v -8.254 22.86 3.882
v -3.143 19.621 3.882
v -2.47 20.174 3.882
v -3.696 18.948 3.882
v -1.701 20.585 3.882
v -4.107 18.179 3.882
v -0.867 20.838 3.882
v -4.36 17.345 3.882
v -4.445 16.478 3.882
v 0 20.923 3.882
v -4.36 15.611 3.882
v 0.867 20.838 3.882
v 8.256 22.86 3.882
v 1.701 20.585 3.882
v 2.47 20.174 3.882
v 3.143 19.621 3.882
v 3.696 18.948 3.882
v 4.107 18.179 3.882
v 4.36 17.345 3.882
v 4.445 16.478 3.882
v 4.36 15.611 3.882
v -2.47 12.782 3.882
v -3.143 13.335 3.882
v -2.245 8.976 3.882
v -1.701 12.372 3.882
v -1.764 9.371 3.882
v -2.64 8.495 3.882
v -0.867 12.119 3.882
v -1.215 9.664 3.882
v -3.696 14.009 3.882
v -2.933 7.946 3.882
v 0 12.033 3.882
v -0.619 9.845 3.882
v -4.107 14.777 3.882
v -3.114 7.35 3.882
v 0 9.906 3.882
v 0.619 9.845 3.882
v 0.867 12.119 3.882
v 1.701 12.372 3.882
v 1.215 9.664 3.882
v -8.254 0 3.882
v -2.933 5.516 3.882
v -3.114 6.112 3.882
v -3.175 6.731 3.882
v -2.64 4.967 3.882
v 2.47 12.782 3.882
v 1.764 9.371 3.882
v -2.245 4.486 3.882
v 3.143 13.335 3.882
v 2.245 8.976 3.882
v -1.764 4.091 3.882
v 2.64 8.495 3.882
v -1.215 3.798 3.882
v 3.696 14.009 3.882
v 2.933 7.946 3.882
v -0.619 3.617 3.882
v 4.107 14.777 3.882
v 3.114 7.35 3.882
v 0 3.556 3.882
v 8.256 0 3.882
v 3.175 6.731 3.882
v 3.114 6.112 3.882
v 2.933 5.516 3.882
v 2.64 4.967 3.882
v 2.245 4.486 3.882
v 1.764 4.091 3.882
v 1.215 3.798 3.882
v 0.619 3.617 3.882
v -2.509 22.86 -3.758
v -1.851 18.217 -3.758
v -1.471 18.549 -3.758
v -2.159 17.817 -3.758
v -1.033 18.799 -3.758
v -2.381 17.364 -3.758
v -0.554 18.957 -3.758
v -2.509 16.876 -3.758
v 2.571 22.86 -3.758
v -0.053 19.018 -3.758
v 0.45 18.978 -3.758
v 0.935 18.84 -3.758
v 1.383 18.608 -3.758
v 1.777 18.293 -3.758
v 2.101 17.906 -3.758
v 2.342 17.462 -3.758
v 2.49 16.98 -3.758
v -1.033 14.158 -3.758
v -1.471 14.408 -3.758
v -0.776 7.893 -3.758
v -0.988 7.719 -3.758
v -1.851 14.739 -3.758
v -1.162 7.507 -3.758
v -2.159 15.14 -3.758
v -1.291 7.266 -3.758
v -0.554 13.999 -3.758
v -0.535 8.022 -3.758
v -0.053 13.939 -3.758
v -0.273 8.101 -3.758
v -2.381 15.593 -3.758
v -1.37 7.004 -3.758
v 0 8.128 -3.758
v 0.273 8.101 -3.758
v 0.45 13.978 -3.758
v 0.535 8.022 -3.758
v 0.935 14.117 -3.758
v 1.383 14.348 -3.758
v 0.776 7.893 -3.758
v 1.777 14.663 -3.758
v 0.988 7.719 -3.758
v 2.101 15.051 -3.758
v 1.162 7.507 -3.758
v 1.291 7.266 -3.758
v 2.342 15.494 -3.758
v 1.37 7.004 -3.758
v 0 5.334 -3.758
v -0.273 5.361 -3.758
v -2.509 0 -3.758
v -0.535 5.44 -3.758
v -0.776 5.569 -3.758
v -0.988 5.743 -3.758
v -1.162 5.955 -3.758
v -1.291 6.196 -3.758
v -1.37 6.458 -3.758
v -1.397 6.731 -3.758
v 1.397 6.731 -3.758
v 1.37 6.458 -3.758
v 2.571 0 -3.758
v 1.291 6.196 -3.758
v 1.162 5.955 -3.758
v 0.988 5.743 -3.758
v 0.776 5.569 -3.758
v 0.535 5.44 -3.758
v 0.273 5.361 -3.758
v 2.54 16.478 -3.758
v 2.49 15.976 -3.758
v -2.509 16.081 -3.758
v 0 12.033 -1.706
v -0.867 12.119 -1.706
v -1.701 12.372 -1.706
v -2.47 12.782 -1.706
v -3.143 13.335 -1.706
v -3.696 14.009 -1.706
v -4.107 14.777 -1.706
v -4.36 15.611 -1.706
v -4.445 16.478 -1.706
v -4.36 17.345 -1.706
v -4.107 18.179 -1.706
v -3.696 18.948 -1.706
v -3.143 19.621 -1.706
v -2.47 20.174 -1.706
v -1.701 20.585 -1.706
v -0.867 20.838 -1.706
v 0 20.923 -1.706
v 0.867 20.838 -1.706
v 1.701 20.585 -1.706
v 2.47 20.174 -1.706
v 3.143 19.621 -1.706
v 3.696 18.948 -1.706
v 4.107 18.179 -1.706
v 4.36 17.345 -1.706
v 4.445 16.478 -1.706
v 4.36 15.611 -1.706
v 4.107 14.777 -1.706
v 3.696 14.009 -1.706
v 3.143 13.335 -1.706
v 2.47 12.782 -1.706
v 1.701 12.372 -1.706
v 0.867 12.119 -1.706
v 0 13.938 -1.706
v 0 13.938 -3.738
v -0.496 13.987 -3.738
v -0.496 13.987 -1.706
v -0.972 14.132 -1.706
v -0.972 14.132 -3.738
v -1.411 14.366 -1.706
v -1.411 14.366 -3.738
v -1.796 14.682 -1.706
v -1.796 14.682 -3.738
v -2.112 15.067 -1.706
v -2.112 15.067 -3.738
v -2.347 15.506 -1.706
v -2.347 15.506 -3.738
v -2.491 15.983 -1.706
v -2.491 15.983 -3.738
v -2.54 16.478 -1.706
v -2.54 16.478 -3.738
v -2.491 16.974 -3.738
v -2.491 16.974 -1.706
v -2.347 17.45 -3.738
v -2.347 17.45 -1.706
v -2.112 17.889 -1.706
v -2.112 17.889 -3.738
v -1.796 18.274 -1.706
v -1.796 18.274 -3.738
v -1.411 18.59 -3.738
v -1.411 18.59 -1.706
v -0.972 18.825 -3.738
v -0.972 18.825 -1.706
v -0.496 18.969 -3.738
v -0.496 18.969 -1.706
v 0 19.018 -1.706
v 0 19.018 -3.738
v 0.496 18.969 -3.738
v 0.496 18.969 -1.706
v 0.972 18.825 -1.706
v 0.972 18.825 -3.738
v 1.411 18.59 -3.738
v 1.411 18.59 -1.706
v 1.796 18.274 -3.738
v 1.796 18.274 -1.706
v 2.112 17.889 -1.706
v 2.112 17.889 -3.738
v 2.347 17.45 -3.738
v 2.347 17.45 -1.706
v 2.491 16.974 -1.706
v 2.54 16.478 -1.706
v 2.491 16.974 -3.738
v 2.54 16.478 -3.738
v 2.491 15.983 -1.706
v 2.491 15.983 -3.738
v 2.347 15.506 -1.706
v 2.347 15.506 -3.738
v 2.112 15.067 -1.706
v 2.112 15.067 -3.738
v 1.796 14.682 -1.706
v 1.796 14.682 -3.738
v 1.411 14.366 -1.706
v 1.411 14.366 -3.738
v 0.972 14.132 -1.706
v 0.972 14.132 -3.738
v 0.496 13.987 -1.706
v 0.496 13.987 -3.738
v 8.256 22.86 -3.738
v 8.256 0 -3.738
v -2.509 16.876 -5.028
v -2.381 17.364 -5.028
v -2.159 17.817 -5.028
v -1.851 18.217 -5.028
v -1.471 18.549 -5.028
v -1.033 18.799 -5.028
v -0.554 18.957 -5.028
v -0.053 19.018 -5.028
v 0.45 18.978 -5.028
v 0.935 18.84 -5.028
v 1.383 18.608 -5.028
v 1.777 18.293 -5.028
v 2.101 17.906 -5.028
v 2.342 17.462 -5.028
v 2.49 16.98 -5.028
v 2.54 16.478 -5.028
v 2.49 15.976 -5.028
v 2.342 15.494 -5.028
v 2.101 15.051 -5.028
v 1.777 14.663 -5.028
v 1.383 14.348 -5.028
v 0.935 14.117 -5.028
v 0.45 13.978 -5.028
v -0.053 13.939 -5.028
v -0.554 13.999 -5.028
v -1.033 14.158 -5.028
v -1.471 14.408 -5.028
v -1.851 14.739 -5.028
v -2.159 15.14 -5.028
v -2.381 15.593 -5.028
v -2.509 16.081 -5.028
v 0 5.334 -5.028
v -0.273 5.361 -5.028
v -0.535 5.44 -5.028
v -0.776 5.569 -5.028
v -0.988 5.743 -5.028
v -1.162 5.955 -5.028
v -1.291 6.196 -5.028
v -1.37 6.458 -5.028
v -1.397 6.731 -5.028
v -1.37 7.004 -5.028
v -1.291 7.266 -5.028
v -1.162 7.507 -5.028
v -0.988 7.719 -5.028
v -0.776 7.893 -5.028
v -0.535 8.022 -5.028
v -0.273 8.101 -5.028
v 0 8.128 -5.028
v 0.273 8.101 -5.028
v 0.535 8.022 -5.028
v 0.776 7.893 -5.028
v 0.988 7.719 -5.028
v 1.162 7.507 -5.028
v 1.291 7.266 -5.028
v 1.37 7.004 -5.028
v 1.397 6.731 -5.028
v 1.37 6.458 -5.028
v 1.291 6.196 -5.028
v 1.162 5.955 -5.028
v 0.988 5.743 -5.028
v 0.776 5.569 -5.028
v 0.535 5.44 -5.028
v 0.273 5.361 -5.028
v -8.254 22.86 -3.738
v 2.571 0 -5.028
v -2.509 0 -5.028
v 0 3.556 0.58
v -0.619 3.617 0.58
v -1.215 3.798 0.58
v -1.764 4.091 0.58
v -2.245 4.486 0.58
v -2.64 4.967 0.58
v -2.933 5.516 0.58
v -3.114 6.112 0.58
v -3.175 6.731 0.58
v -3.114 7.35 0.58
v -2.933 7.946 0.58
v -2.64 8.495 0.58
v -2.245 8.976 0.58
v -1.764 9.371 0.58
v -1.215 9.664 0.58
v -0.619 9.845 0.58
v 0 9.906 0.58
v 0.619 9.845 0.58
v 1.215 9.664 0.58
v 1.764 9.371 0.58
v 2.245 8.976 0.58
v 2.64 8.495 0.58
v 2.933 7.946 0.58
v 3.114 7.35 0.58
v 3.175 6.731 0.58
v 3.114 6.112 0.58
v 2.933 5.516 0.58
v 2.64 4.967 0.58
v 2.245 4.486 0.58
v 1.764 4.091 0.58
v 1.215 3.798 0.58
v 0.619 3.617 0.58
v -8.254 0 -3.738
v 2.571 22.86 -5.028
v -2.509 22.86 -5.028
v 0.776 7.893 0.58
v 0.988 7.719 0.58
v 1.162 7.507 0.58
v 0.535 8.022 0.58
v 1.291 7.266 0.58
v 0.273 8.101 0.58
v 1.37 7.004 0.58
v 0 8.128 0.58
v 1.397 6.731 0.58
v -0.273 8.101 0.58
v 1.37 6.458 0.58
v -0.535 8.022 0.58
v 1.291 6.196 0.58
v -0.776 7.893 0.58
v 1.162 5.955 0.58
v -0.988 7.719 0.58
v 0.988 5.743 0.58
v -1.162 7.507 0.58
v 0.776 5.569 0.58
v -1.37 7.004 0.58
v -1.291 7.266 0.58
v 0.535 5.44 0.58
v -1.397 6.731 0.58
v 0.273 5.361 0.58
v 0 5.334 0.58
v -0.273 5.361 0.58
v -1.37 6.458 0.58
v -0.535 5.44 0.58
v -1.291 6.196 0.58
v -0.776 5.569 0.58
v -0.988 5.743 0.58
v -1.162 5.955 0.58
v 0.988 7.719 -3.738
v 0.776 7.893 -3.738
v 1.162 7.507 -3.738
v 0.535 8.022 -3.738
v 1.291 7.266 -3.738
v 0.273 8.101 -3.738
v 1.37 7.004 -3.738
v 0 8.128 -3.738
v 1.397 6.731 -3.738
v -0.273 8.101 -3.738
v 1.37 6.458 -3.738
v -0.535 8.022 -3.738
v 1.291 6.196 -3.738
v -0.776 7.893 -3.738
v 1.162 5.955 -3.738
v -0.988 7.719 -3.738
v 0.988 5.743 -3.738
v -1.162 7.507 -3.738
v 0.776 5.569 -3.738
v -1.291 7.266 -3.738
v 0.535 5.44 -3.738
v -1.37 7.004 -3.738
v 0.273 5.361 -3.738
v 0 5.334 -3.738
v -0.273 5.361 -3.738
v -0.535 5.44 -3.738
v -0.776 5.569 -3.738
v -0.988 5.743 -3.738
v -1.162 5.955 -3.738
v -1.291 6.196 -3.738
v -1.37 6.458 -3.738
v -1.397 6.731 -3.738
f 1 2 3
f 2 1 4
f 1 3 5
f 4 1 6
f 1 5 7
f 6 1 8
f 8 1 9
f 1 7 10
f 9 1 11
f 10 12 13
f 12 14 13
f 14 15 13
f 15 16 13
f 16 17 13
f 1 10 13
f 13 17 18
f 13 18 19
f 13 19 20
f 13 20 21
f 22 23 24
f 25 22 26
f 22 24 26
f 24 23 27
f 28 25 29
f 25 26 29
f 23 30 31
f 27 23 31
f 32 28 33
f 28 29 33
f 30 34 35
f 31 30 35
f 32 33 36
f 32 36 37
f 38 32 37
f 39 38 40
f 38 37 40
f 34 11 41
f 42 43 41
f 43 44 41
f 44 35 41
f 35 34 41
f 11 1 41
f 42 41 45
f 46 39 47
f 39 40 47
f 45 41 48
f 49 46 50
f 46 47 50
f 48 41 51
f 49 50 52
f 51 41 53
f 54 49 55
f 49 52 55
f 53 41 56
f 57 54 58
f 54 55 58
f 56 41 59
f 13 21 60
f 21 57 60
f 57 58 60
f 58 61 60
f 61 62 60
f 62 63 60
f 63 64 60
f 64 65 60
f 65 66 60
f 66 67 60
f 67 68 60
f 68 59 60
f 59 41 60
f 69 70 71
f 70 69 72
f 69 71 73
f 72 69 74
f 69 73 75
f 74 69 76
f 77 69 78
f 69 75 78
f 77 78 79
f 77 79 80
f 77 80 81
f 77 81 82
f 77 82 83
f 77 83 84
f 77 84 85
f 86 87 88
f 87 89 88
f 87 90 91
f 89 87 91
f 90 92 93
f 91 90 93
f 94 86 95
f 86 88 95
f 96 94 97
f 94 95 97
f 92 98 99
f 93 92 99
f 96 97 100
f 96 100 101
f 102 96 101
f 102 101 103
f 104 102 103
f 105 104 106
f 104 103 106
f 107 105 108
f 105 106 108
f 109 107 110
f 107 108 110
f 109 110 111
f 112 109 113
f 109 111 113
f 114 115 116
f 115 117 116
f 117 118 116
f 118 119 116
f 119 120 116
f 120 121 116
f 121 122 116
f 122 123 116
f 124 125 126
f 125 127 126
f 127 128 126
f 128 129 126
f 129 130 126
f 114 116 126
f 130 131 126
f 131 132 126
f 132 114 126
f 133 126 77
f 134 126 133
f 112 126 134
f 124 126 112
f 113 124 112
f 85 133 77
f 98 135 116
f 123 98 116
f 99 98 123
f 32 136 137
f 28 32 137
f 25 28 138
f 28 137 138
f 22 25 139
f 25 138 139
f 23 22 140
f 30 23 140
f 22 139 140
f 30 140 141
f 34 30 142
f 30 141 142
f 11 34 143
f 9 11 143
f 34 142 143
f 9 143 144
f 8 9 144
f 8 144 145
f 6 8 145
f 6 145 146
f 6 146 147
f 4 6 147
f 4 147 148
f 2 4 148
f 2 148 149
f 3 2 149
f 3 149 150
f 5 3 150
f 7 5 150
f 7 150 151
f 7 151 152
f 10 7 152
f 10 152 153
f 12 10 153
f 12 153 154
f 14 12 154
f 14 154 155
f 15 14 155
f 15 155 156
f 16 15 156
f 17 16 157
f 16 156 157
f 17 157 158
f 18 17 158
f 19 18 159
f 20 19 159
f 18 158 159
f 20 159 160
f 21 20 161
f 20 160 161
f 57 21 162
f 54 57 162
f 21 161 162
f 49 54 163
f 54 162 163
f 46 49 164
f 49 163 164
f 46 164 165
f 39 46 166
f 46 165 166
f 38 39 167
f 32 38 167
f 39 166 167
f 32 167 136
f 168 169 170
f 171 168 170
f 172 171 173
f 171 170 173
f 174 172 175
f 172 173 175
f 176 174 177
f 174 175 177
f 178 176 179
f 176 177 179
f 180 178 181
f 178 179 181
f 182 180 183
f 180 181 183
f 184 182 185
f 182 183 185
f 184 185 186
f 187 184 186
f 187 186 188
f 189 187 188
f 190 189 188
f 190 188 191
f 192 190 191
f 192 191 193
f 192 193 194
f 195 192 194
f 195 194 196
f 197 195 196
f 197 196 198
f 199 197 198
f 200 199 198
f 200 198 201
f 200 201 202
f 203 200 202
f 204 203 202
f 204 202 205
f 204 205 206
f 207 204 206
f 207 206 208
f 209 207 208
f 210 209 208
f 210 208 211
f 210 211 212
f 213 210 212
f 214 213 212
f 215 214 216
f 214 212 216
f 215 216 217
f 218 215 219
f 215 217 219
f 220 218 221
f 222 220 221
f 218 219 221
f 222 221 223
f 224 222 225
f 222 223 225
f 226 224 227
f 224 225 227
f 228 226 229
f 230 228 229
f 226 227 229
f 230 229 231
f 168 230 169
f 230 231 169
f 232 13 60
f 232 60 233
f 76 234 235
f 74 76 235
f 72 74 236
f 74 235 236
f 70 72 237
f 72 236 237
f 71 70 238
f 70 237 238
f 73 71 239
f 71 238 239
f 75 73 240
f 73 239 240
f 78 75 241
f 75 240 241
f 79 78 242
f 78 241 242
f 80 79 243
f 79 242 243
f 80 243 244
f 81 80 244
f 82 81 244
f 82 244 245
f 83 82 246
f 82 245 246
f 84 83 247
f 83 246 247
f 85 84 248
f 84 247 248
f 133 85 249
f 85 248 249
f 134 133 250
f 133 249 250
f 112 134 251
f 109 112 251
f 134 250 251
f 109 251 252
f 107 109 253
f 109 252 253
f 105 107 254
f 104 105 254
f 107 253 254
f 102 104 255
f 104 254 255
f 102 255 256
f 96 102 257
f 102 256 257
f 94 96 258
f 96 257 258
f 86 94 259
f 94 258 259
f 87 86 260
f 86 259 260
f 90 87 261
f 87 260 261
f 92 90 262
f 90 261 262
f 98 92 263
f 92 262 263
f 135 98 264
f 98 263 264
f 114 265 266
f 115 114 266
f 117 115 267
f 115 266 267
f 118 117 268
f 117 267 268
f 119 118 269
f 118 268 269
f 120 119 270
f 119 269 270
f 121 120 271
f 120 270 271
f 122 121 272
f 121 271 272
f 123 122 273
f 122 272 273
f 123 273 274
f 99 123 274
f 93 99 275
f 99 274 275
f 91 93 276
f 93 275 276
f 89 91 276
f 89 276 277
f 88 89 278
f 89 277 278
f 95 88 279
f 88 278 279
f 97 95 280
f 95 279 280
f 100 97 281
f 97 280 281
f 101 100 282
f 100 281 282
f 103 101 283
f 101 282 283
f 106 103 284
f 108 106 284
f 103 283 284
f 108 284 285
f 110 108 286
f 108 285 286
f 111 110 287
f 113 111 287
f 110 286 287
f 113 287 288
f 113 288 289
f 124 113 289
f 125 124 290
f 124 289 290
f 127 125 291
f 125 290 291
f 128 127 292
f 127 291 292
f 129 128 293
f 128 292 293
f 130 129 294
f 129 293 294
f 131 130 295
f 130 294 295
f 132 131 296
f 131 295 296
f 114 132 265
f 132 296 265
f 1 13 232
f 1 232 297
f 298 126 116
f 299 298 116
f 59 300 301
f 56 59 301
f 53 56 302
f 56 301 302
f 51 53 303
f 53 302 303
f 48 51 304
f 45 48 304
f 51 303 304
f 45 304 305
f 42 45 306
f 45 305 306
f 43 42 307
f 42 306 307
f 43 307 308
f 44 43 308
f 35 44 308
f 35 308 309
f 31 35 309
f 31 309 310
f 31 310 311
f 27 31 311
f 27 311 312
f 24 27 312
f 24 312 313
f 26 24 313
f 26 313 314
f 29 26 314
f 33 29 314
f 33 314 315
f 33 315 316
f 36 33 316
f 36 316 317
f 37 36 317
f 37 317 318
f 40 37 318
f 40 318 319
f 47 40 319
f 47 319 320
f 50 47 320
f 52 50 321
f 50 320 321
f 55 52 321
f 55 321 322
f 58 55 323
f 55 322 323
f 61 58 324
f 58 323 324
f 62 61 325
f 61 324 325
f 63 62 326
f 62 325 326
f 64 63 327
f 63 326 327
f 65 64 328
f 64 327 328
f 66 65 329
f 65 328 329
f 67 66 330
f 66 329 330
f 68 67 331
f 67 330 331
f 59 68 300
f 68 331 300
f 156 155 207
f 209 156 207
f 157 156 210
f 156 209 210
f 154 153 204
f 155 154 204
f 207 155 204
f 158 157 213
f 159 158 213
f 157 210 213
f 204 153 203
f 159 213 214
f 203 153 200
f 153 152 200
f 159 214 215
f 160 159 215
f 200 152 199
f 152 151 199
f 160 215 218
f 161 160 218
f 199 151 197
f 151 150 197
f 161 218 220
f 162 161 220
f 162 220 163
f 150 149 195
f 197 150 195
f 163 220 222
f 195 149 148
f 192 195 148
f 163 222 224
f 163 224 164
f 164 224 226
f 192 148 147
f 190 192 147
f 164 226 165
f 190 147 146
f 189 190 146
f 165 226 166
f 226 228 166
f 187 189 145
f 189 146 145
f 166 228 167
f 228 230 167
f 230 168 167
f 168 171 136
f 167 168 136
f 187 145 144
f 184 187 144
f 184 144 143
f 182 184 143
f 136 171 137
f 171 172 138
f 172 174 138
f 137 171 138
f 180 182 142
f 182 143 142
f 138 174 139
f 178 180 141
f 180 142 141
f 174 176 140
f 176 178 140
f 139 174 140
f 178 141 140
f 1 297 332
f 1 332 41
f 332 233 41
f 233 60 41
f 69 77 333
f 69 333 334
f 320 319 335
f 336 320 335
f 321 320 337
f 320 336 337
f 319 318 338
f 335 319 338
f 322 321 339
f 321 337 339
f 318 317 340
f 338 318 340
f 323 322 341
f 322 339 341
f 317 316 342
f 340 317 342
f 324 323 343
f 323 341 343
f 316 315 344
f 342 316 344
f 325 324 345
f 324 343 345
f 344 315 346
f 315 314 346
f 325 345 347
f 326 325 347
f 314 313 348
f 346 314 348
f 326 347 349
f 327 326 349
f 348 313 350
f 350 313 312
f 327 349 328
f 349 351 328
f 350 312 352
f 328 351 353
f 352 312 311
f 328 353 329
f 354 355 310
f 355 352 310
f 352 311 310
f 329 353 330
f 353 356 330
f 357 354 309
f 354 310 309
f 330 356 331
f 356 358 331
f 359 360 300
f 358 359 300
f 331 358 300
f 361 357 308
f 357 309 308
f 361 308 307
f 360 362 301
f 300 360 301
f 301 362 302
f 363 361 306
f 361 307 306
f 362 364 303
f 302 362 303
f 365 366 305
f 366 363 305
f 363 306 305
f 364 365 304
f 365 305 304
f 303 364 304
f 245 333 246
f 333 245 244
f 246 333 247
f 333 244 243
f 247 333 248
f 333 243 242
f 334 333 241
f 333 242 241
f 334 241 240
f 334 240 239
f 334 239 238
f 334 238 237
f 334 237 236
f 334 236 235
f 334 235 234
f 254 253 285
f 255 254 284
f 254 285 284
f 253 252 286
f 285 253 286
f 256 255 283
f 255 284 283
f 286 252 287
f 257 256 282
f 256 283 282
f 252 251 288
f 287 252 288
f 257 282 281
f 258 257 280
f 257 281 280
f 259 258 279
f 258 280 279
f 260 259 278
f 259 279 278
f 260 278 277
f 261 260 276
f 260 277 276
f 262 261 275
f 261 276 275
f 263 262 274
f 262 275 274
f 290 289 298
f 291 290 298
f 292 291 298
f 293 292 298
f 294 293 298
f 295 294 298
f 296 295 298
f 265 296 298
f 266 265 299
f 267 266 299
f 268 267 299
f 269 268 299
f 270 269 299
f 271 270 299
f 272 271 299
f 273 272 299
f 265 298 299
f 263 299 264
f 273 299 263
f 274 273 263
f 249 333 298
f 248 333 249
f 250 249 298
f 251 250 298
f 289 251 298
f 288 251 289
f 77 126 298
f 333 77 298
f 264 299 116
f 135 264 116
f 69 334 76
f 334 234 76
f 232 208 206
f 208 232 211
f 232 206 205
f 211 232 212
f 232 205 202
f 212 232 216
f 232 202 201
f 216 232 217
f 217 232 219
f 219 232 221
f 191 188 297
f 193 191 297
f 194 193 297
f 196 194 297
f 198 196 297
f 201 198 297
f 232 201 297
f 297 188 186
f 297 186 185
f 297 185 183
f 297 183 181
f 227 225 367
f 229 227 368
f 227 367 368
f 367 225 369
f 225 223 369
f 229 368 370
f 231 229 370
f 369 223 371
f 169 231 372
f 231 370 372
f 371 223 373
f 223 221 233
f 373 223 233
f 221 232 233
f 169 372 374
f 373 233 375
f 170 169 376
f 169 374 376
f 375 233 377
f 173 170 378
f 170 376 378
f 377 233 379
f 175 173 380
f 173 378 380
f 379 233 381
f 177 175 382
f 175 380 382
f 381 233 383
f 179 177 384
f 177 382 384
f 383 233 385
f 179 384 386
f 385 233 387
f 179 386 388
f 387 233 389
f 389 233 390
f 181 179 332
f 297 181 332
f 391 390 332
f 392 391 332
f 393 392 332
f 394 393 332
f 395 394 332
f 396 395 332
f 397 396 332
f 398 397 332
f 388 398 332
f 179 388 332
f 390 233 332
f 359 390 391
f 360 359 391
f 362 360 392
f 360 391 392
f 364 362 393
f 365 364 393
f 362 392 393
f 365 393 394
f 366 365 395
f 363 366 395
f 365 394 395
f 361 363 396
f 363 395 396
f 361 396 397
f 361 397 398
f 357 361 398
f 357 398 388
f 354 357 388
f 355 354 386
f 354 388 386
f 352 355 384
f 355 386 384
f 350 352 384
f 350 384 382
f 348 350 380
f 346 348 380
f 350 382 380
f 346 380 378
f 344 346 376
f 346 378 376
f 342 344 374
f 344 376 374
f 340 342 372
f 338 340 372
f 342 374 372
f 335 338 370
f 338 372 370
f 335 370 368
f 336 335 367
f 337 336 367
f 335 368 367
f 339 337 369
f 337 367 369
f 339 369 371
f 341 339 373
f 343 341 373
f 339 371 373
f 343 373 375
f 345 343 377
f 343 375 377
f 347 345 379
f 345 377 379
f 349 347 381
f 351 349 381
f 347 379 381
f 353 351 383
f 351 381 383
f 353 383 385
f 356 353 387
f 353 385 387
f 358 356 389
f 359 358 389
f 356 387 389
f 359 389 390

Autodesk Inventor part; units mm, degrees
ref_plane "YZ Plane" through (0, 0, 0) normal (1, 0, 0) x (0, 1, 0)
ref_plane "XZ Plane" through (0, 0, 0) normal (0, 1, 0) x (-1, 0, 0)
ref_plane "XY Plane" through (0, 0, 0) normal (0, 0, 1) x (1, 0, 0)
sketch "Sketch1" plane through (0, 0, 0) normal (0, 1, 0) x (-1, 0, 0)
  line L0 (8.2539, 3.8822) -> (-8.2561, 3.8822)
  line L1 (-8.2561, 3.8822) -> (-8.2561, -3.7378)
  line L2 (-8.2561, -3.7378) -> (8.2539, -3.7378)
  line L3 (8.2539, -3.7378) -> (8.2539, 3.8822)
  line L4 (2.5087, -3.7583) -> (-2.5713, -3.7583)
  line L5 (-2.5713, -3.7583) -> (-2.5713, -5.0283)
  line L6 (-2.5713, -5.0283) -> (2.5087, -5.0283)
  line L7 (2.5087, -5.0283) -> (2.5087, -3.7583)
  point P0 (0, 0)
  dimension "d0" = 16.51
  dimension "d1" = 7.62
  dimension "d2" = 5.08
  dimension "d3" = 1.27
extrude "Extrusion1" add sketch "Sketch1" along normal blind 22.86
sketch "Sketch8" plane through (-8.2539, 0, 3.8822) normal (0, 0, 1) x (1, 0, 0)
  line L0 (8.2539, 0) -> (8.2539, 6.731)
  dimension "d38" = 6.731
hole "Hole5" at (0, 6.731, 3.8822) direction (0, 0, -1) diameter 2.794 end through all counterbore diameter 6.35 counterbore depth 3.302
sketch "Sketch9" plane through (-8.2539, 0, 3.8822) normal (0, 0, 1) x (1, 0, 0)
  line L0 (8.2539, 22.9552) -> (8.2539, 16.4782)
  point P0 (8.2539, 0)
  dimension "d46" = 6.477
hole "Hole6" at (0, 16.4782, 3.8822) direction (0, 0, -1) diameter 5.08 end through all counterbore diameter 8.89 counterbore depth 5.588
